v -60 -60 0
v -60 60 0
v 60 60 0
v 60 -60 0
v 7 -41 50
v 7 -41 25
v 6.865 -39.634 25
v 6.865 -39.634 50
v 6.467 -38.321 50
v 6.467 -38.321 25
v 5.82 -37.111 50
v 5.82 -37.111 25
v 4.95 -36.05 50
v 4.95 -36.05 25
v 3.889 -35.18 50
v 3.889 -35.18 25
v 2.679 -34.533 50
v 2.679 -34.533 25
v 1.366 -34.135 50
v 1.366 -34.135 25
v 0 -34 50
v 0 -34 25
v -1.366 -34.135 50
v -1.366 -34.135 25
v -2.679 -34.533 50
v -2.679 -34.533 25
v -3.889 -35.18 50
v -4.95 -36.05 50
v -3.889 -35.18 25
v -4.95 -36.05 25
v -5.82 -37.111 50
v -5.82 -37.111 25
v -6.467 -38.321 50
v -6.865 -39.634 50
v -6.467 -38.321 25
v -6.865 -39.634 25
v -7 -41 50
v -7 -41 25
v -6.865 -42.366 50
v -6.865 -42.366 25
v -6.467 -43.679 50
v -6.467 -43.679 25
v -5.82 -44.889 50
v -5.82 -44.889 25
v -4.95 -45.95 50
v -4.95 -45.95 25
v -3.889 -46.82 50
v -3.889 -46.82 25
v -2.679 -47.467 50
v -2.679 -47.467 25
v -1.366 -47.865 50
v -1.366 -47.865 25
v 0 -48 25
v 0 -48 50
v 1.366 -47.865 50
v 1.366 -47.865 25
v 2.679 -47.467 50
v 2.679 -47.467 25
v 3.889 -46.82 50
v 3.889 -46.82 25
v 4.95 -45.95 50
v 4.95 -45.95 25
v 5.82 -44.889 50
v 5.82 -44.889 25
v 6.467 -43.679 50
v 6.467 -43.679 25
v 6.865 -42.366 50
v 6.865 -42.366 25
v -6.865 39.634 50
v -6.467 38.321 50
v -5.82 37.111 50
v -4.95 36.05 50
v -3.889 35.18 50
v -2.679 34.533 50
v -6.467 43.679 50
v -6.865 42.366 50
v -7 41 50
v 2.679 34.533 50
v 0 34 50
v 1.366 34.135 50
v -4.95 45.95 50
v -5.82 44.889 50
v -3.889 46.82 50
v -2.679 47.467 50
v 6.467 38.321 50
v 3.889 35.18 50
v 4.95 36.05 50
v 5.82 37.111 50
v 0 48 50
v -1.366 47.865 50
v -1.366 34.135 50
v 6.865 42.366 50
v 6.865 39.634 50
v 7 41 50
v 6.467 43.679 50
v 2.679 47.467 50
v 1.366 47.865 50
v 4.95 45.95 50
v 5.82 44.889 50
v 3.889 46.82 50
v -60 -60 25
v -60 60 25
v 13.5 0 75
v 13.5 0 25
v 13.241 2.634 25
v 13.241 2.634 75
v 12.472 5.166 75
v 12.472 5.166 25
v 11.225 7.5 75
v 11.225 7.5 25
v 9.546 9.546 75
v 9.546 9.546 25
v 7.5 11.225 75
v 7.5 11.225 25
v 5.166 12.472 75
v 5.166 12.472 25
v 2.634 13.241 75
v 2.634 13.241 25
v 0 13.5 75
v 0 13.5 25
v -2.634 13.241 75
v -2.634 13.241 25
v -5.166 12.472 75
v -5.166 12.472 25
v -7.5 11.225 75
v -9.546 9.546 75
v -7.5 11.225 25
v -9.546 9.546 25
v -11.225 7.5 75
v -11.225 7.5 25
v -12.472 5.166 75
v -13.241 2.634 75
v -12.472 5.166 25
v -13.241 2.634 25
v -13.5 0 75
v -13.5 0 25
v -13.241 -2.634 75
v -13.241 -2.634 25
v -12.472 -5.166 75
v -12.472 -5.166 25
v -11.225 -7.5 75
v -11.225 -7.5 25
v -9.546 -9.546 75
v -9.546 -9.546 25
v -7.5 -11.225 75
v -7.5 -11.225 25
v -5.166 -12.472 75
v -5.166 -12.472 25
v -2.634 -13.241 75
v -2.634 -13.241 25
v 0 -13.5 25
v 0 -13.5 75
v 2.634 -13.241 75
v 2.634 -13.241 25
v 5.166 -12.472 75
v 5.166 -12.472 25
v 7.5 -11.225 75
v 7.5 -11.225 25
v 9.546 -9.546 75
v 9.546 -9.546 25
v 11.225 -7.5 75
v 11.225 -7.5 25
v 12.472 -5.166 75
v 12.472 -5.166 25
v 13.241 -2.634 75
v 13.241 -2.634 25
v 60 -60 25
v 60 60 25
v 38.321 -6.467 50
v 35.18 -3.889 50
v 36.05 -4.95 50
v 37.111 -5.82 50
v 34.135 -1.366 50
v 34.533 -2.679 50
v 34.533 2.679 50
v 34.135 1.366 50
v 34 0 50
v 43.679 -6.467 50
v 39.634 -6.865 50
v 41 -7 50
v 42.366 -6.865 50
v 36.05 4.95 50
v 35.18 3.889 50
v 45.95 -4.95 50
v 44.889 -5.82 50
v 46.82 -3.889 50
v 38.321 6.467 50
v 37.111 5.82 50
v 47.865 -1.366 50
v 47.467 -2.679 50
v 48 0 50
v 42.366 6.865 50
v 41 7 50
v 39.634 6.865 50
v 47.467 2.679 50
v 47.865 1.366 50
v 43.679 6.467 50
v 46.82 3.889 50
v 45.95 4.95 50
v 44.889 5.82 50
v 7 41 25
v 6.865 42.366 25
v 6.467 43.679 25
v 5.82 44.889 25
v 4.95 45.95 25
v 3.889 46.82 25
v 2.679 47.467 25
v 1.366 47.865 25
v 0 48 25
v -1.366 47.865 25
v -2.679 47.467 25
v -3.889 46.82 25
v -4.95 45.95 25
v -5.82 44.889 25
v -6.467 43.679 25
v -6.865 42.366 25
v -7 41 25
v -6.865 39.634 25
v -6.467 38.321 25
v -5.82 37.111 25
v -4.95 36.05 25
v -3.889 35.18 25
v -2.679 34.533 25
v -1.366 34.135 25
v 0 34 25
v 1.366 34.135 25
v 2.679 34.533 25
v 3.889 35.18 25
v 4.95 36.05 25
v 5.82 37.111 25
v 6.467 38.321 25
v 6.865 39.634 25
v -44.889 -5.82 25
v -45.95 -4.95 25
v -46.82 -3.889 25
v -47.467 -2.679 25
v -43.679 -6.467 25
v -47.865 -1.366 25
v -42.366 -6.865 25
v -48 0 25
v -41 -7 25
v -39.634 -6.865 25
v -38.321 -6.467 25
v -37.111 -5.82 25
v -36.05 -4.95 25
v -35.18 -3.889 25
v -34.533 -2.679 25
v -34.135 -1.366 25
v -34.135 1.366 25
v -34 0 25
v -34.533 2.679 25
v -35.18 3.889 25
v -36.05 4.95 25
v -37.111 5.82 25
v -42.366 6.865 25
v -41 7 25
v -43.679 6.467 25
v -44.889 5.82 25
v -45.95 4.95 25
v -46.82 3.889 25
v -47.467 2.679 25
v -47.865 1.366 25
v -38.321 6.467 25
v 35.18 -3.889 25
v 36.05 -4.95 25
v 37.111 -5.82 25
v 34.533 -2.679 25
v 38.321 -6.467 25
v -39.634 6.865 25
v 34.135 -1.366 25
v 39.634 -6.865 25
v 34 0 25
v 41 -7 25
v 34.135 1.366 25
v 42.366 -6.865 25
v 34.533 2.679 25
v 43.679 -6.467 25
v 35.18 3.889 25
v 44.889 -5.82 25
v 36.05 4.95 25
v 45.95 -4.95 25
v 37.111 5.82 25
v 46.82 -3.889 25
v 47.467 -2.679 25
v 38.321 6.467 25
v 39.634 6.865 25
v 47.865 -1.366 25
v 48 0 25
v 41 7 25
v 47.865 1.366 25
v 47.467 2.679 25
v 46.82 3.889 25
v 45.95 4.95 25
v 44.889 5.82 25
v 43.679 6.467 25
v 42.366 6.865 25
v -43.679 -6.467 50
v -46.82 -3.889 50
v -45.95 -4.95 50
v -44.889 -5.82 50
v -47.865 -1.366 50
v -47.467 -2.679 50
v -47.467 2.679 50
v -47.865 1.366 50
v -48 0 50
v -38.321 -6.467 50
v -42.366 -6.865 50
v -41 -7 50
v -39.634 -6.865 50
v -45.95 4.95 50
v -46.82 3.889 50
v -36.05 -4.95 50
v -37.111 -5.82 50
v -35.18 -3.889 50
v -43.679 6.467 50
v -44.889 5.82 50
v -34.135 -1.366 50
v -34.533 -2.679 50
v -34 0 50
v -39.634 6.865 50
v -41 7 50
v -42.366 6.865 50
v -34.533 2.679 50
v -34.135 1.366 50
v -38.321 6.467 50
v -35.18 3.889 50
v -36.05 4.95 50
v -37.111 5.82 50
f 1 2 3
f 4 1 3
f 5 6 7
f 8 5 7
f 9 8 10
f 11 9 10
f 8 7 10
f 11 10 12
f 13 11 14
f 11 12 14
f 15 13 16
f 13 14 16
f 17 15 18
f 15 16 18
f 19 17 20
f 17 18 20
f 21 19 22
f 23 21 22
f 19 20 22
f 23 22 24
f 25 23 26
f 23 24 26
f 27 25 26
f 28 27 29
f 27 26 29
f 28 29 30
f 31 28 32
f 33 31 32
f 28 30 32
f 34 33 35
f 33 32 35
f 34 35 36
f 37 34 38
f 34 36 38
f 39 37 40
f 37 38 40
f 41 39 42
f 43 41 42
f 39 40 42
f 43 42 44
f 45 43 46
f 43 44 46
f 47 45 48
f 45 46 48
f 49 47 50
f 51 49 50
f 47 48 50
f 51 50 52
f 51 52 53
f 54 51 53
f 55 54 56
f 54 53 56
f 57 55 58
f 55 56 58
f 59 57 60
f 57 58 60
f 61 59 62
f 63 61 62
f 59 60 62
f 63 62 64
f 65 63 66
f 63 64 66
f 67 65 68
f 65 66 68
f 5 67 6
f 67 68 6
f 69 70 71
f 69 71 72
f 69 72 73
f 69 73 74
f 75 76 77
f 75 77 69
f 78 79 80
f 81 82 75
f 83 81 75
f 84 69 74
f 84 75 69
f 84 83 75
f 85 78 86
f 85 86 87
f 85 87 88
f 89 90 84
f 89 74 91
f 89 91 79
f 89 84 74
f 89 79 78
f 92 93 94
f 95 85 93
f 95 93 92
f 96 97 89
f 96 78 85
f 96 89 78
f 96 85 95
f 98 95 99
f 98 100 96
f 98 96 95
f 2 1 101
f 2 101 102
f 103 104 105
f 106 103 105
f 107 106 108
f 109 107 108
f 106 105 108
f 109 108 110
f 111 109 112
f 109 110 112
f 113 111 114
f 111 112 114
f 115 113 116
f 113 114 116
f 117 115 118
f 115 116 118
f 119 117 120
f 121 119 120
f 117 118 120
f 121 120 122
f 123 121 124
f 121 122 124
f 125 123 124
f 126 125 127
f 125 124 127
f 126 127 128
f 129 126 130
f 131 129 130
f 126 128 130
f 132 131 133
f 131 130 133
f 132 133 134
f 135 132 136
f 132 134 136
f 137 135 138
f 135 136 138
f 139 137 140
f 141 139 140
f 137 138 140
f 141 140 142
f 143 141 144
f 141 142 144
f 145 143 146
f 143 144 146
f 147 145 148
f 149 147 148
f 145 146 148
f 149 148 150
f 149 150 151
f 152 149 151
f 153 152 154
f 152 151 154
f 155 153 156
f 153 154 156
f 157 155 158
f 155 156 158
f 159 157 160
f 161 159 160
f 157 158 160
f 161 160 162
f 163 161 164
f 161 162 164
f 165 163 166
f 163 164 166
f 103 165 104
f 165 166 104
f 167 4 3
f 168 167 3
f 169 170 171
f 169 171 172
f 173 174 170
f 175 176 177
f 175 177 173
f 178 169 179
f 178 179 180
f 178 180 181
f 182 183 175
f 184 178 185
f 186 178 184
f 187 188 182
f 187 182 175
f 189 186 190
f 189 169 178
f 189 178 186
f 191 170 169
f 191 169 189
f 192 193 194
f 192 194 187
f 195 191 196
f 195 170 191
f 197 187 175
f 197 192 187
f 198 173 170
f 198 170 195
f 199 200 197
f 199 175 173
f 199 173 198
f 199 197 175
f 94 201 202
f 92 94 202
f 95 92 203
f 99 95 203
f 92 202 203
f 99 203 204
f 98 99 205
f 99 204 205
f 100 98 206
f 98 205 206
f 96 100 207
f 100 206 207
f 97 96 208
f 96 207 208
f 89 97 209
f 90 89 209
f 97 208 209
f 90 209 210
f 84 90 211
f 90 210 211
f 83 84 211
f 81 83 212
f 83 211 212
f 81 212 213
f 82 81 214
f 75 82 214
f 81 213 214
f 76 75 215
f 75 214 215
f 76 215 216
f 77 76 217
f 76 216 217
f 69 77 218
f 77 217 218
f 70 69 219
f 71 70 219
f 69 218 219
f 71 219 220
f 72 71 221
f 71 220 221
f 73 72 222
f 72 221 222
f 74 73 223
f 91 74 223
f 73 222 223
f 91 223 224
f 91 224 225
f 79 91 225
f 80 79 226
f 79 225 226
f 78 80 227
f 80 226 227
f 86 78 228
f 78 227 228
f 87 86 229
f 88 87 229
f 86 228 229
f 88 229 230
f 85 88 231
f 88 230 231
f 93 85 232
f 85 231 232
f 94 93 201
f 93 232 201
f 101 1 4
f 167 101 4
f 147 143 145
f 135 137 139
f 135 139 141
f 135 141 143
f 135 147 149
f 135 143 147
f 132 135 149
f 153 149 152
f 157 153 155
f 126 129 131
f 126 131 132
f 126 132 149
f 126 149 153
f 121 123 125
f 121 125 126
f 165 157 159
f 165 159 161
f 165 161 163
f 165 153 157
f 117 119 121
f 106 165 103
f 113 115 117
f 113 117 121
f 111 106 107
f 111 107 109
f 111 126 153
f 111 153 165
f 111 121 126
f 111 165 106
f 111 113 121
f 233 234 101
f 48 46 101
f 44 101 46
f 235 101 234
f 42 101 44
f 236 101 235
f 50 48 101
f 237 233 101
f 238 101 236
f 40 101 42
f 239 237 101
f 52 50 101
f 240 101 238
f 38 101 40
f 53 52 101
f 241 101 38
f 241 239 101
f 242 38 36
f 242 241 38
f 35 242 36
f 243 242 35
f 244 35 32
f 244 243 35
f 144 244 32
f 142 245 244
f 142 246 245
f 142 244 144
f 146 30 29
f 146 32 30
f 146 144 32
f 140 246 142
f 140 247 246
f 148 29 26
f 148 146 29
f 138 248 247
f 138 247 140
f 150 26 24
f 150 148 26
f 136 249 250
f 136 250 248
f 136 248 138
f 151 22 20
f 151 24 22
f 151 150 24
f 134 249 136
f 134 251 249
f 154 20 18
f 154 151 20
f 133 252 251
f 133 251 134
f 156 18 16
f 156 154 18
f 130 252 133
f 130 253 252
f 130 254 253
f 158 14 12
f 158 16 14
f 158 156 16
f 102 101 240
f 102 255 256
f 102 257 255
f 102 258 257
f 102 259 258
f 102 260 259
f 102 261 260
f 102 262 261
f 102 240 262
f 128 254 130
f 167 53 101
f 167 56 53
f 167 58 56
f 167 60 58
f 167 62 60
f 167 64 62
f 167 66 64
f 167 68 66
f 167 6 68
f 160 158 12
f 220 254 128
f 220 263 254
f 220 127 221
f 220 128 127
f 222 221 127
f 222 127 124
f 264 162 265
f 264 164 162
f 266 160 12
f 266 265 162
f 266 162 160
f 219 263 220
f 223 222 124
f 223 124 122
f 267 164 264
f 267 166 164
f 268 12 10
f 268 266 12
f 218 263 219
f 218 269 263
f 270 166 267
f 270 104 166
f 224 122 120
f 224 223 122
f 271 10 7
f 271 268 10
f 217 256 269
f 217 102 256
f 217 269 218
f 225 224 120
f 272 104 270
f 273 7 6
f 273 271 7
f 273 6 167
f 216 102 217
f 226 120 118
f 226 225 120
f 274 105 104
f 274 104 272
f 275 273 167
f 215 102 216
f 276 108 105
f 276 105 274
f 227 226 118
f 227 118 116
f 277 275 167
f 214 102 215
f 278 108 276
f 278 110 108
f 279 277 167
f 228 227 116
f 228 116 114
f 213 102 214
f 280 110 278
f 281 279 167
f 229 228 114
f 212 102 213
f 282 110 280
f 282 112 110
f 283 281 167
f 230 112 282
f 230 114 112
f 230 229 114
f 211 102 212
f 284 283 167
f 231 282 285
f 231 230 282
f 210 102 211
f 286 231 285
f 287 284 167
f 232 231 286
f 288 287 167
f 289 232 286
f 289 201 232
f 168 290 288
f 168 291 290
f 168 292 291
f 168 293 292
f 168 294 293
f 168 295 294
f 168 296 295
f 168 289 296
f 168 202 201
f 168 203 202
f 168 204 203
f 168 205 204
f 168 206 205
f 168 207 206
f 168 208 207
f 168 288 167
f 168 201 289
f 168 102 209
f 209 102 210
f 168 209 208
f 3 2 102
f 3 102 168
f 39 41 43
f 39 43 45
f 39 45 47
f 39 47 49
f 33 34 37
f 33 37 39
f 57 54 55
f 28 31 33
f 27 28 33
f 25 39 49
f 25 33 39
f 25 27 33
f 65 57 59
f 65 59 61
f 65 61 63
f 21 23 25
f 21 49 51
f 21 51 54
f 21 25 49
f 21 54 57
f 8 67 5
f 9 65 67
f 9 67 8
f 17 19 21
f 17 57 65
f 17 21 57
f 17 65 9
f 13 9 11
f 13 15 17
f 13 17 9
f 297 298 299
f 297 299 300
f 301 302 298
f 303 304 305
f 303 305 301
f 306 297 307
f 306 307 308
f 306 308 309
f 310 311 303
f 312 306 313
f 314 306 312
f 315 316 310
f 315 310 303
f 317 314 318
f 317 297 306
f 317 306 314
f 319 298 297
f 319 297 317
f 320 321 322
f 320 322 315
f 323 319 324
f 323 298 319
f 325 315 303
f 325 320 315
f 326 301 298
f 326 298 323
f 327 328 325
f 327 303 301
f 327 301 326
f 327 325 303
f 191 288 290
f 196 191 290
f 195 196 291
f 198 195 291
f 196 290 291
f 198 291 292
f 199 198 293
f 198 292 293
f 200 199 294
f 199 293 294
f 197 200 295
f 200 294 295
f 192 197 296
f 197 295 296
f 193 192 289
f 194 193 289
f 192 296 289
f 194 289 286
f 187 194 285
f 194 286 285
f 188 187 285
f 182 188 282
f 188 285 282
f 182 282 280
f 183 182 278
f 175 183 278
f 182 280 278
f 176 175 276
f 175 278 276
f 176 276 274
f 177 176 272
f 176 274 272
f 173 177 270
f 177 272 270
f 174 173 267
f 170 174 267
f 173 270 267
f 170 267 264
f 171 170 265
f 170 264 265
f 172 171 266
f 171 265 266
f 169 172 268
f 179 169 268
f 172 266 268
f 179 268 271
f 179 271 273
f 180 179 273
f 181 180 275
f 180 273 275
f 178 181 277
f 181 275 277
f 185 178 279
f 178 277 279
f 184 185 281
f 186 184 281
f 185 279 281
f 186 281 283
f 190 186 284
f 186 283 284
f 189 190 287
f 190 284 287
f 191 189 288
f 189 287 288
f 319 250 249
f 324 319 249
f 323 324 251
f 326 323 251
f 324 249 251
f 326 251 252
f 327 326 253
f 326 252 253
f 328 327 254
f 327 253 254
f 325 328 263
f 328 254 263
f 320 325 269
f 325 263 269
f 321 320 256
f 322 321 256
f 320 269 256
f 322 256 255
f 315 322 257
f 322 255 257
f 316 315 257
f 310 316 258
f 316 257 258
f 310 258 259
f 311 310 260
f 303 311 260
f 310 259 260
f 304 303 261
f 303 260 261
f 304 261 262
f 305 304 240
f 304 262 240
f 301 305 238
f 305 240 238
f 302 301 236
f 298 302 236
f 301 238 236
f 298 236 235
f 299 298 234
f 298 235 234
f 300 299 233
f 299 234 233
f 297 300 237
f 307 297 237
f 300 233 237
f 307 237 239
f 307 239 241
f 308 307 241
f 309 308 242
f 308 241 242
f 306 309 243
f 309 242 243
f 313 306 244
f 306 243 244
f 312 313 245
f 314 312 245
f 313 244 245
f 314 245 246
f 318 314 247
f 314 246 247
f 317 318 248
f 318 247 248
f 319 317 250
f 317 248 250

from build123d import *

# Parameters (mm, degrees)
F0_W     = 120
F0_H     = 120
F1_DEPTH = 25
F2_R     = 7
F3_DEPTH = 25
F4_R     = 13.5
F5_DEPTH = 50


with BuildPart() as f1:
    # F0 (on Top) → F1 (new body)
    with BuildSketch(Plane.XY):
        Rectangle(F0_W, F0_H)
    extrude(amount=F1_DEPTH)

    # F2 (on face) → F3 (join)
    with BuildSketch(Plane.XY.offset(25)):
        with Locations((0, 41)):
            Circle(F2_R)
        with Locations((-41, 0)):
            Circle(F2_R)
        with Locations((0, -41)):
            Circle(F2_R)
        with Locations((41, 0)):
            Circle(F2_R)
    extrude(amount=F3_DEPTH)

    # F4 (on face) → F5 (join)
    with BuildSketch(Plane.XY.offset(25)):
        Circle(F4_R)
    extrude(amount=F5_DEPTH)


solid = f1.part
